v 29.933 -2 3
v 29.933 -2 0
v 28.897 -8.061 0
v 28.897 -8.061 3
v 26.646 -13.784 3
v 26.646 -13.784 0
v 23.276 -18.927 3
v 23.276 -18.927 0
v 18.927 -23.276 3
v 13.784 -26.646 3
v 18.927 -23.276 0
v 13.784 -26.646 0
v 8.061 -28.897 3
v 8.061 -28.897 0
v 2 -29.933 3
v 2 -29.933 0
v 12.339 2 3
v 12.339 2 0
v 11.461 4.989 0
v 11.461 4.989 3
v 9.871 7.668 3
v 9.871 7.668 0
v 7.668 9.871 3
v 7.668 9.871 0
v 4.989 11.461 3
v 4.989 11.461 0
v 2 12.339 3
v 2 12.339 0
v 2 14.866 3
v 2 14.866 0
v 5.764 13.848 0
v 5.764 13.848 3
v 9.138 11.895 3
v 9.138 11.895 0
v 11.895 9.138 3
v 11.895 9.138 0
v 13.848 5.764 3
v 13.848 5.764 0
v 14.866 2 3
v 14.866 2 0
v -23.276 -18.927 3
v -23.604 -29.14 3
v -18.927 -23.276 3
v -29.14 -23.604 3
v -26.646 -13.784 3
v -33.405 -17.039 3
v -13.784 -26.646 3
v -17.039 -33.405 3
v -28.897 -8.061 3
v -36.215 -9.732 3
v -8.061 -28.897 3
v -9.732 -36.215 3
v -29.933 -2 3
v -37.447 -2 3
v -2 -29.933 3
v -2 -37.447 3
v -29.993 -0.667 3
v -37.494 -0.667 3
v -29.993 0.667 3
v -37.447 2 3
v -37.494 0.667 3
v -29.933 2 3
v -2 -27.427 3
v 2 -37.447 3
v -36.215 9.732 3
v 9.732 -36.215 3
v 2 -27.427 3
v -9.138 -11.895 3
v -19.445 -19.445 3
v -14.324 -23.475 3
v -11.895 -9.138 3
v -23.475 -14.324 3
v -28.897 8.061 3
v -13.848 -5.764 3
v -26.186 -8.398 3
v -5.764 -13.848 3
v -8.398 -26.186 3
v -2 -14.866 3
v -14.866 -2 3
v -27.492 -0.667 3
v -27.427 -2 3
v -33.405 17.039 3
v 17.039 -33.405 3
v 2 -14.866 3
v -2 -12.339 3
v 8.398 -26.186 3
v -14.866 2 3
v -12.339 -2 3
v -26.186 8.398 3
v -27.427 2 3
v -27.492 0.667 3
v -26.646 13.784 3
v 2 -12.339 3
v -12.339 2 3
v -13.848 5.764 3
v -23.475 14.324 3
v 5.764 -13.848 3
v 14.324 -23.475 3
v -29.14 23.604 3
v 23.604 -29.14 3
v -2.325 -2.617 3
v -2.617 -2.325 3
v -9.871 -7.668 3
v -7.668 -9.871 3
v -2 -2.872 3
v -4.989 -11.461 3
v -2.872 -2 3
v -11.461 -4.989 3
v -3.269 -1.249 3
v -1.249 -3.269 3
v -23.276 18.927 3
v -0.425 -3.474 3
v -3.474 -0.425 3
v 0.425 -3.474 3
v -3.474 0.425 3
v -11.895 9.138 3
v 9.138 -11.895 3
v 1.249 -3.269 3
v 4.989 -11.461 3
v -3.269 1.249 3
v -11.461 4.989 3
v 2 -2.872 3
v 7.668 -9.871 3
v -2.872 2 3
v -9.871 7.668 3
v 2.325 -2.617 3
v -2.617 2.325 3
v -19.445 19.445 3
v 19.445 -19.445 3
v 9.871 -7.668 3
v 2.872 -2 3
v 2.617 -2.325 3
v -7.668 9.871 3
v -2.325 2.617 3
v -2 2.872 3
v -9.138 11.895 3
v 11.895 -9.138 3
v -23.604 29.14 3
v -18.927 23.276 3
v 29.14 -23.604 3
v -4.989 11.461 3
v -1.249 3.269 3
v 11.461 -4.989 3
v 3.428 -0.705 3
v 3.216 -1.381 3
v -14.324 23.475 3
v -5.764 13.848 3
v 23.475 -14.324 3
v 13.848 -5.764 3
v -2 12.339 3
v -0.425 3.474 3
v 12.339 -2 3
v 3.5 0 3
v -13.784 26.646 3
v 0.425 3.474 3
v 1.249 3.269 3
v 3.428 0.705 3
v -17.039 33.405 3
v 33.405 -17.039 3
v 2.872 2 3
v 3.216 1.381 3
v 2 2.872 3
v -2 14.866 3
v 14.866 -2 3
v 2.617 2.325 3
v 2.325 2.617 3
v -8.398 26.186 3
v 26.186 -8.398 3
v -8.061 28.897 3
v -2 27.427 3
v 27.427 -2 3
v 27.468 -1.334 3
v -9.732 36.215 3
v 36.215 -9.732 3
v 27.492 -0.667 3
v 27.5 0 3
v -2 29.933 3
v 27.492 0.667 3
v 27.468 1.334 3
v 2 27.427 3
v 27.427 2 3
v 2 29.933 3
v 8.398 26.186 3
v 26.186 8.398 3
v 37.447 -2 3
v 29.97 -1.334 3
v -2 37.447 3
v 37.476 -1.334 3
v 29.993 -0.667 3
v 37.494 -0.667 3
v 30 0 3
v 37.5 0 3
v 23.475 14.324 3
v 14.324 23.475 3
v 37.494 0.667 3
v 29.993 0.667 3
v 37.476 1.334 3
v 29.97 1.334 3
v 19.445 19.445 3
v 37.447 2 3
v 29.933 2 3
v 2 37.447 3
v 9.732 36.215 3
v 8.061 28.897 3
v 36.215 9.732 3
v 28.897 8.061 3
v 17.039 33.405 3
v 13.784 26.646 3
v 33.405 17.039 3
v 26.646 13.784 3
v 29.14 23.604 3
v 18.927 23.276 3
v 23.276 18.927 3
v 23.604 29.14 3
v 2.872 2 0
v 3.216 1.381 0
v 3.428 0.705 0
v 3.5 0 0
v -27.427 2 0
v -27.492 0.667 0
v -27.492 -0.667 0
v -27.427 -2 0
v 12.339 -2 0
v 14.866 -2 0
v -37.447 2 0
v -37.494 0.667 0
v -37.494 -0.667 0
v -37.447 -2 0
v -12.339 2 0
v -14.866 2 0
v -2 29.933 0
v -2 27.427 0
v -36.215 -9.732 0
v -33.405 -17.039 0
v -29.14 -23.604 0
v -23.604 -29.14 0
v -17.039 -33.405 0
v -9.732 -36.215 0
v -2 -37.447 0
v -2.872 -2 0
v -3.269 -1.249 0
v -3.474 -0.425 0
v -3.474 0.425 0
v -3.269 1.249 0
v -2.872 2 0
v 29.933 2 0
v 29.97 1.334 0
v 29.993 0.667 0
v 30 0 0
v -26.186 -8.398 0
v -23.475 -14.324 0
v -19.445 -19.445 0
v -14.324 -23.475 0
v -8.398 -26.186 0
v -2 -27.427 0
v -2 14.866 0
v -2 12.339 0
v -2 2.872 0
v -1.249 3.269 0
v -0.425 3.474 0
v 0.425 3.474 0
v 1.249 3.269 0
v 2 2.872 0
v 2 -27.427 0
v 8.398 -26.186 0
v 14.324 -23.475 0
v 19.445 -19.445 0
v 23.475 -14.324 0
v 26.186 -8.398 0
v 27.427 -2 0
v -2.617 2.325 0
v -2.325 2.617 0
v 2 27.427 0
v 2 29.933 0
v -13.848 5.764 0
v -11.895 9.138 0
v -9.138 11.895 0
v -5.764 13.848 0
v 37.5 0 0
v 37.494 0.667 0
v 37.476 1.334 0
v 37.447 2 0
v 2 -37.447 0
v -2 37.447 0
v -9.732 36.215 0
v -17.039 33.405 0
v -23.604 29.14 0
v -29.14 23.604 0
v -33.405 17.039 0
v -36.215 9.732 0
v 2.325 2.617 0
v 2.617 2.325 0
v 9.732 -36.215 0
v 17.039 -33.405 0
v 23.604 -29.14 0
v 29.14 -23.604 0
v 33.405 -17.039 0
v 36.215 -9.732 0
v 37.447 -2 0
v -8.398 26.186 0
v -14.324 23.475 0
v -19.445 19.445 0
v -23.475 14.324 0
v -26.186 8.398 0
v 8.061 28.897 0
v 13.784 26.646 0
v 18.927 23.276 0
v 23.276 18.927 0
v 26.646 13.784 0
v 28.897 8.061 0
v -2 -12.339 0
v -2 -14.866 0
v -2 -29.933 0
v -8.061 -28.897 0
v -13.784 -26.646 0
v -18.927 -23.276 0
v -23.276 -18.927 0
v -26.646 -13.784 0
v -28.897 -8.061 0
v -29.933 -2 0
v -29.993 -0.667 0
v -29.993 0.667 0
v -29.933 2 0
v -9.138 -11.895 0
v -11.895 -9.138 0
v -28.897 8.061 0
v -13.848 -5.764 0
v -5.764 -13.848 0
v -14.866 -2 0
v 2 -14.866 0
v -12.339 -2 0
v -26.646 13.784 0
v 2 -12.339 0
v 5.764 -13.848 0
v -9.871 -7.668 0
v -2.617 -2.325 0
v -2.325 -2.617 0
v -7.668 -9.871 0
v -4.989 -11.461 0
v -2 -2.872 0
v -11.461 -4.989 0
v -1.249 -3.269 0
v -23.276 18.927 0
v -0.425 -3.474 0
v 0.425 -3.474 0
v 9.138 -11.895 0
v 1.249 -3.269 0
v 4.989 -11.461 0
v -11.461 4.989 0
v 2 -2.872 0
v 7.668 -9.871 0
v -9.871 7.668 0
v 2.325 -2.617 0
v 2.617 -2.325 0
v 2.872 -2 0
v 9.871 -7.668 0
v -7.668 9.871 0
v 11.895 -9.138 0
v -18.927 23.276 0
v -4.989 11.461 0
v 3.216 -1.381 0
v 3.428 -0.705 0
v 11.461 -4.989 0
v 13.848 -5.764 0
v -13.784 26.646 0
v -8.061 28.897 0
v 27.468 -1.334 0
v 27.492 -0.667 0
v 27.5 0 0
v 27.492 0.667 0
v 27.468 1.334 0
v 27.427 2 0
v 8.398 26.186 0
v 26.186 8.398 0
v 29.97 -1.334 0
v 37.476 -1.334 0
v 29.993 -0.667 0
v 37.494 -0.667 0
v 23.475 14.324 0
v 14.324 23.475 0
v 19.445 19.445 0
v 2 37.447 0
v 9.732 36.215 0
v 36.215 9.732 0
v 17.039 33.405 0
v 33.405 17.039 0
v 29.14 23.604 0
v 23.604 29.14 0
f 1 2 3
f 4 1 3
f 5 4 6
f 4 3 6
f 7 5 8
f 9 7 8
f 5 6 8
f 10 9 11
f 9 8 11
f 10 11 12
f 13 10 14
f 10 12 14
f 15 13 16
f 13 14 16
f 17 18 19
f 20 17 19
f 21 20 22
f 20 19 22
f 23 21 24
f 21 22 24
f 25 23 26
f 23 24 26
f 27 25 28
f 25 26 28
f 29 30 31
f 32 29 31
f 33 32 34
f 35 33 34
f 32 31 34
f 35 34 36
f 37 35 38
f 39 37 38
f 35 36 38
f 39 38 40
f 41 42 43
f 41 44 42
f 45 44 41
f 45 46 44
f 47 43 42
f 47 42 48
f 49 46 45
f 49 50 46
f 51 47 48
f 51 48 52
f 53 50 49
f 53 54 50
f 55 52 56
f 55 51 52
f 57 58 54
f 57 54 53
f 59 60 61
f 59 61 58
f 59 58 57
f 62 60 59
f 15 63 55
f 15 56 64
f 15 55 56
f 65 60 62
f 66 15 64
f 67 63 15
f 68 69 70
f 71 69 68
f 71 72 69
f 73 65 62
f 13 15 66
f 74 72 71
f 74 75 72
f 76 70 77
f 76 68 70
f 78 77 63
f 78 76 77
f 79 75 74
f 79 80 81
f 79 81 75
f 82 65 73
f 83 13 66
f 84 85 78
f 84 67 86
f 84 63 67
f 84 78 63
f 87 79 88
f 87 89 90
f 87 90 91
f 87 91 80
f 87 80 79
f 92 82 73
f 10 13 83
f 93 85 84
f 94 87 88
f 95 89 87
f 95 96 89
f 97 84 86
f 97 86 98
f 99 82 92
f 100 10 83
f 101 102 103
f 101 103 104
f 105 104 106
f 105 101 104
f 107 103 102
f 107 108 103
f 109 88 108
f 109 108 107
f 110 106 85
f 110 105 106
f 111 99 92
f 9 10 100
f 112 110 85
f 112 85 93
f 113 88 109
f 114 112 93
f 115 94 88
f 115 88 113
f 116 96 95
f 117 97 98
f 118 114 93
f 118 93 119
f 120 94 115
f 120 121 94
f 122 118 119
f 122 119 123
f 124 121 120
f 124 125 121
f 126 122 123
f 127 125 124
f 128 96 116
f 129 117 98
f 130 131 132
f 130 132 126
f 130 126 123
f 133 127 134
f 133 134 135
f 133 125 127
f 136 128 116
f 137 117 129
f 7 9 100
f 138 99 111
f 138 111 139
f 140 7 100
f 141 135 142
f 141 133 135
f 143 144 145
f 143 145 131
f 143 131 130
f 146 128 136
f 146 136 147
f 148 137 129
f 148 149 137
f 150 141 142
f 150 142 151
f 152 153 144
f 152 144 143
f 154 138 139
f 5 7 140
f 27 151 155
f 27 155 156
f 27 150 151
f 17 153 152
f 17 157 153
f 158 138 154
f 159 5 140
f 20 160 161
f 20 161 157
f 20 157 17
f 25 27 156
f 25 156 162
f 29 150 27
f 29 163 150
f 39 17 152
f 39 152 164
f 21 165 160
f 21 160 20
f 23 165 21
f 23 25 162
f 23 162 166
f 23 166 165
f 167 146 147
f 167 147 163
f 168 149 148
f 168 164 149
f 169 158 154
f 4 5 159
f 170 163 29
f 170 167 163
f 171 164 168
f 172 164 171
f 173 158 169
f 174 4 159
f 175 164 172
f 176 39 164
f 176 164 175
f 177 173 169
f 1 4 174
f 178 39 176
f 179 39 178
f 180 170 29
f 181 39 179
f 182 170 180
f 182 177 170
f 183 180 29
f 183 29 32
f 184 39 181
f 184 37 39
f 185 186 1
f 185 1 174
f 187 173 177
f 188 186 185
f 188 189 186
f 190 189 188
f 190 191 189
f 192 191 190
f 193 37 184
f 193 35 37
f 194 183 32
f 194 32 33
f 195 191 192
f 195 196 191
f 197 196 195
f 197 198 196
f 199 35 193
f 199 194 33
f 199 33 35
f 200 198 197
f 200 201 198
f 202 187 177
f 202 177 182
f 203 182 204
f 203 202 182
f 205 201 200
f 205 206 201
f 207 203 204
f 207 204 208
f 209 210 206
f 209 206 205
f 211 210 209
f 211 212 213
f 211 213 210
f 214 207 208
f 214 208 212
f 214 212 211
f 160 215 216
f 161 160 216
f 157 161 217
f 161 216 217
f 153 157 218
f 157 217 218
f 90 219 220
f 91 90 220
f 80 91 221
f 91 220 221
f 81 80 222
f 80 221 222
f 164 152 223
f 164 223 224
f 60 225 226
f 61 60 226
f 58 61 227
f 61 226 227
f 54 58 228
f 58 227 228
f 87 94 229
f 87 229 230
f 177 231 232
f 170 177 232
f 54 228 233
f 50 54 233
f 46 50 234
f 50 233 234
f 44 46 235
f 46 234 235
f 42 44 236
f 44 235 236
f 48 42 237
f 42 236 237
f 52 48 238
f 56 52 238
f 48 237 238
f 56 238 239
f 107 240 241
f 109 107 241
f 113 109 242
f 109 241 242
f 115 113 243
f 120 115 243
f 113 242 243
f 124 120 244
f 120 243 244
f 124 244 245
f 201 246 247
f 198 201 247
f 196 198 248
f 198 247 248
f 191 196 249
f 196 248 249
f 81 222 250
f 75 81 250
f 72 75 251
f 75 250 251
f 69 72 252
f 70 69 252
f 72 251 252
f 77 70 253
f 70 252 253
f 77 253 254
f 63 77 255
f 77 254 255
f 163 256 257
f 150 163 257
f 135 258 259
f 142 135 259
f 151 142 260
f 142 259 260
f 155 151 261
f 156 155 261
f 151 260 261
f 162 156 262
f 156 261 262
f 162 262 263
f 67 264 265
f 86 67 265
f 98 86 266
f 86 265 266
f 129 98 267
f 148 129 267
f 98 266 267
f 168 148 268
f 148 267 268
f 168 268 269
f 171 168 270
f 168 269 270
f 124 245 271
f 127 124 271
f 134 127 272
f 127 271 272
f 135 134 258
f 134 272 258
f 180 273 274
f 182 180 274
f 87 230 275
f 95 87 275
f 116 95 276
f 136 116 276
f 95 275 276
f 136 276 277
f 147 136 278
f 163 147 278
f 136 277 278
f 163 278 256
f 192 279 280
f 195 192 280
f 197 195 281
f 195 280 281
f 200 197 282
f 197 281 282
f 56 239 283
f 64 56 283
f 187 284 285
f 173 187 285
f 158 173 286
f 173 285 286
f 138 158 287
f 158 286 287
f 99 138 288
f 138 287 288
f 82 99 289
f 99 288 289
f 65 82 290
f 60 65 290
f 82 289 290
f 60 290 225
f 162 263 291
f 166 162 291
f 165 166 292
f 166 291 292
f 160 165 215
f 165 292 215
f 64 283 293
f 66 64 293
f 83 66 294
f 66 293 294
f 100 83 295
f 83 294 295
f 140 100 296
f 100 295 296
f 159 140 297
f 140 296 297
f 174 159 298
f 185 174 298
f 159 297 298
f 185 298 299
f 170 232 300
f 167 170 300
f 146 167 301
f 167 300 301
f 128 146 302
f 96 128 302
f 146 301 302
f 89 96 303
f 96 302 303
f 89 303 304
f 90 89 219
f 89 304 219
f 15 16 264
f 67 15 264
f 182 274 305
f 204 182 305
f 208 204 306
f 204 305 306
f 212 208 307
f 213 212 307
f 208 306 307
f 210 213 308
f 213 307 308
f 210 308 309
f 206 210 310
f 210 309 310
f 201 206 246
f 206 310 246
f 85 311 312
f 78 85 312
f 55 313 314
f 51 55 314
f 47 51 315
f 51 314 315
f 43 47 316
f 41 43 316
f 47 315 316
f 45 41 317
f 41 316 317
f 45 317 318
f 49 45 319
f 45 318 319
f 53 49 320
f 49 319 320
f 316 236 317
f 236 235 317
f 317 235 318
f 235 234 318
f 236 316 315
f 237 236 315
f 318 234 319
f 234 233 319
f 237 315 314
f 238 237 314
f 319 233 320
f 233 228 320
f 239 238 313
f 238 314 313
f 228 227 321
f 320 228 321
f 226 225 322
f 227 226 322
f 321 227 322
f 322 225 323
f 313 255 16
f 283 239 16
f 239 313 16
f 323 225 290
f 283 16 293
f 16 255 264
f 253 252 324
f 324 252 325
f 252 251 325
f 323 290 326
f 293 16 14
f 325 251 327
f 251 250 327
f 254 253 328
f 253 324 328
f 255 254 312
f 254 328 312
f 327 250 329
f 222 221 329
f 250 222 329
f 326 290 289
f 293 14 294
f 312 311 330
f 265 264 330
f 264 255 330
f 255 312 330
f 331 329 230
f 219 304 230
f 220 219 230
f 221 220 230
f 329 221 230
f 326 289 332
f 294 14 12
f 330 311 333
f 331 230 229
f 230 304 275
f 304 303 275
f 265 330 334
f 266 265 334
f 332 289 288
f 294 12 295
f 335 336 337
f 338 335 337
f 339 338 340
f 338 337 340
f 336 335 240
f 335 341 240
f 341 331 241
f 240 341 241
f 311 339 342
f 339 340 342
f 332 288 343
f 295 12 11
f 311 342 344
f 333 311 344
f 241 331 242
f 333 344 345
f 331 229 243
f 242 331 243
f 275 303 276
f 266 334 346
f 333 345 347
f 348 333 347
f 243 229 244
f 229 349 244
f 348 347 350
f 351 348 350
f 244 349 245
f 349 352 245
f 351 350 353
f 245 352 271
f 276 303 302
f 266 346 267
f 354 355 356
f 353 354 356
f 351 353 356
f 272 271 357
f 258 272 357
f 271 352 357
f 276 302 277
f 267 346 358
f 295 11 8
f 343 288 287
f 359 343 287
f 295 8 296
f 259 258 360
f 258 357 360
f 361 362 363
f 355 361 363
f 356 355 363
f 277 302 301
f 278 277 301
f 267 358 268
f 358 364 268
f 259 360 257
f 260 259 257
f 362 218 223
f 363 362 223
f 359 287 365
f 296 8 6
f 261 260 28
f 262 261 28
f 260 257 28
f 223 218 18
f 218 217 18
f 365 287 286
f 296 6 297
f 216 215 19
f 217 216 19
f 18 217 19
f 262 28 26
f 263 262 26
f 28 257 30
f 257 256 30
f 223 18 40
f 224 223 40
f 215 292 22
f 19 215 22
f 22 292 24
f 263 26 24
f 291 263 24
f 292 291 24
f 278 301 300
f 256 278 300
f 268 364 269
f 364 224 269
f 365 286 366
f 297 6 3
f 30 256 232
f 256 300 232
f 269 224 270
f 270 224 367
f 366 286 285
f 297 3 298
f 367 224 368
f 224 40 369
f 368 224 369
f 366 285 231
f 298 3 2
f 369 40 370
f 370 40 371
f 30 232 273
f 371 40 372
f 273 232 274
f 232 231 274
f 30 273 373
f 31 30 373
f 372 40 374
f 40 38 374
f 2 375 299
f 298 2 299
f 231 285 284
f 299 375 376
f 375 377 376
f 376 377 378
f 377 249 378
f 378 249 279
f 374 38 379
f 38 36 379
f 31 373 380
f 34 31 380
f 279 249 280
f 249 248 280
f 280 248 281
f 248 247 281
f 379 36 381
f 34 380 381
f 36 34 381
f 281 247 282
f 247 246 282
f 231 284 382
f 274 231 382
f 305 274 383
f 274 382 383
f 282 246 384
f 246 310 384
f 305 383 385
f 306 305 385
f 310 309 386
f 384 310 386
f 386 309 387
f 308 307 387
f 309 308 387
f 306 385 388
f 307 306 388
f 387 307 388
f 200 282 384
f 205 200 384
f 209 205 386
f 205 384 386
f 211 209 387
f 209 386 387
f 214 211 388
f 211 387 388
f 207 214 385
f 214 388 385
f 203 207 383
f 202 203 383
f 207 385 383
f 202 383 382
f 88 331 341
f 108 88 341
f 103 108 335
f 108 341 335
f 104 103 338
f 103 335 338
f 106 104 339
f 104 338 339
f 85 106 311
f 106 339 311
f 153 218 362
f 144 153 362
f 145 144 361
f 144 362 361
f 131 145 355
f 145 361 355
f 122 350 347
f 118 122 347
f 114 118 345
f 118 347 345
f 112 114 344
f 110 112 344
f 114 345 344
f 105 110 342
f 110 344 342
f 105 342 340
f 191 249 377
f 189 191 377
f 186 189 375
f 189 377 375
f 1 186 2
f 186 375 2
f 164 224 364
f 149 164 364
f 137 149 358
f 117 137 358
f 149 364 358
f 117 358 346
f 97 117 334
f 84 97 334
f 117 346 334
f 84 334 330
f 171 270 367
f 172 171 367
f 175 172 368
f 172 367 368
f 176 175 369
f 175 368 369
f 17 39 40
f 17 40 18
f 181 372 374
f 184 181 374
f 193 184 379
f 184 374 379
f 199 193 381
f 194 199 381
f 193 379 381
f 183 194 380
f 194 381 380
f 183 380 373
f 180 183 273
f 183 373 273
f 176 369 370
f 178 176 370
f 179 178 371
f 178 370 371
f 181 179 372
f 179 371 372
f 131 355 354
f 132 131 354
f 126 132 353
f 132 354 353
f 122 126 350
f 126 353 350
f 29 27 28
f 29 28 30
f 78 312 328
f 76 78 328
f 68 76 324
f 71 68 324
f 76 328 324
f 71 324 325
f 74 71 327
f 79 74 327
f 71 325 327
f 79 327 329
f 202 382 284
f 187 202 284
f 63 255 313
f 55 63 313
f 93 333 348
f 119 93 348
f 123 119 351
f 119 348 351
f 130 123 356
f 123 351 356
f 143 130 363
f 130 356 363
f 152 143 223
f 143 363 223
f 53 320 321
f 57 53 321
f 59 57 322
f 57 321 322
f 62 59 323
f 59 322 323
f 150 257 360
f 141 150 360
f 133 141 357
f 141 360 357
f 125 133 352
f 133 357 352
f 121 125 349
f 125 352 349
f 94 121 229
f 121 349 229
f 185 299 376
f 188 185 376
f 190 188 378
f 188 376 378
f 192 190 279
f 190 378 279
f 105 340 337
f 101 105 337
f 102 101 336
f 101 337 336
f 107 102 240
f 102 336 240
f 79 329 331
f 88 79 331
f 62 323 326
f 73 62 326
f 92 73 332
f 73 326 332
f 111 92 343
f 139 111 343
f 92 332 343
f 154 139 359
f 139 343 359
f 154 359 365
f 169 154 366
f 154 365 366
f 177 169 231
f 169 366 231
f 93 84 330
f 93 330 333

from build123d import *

# Parameters (mm, degrees)
F1_DEPTH = 3


with BuildPart() as f1:
    # F0 (on Top) → F1 (new body)
    with BuildSketch(Plane.XY):
        with BuildLine():
            Line((-2, 29.9332590942), (-2, 37.4466286867))
            ThreePointArc((-2, 37.4466286867), (-26.5165042945, 26.5165042945), (-37.4466286867, 2))
            Line((-37.4466286867, 2), (-29.9332590942, 2))
            ThreePointArc((-29.9332590942, 2), (-21.2132034356, 21.2132034356), (-2, 29.9332590942))
        make_face()
        with BuildLine():
            Line((-29.9332590942, -2), (-37.4466286867, -2))
            ThreePointArc((-37.4466286867, -2), (-26.5165042945, -26.5165042945), (-2, -37.4466286867))
            Line((-2, -37.4466286867), (-2, -29.9332590942))
            ThreePointArc((-2, -29.9332590942), (-21.2132034356, -21.2132034356), (-29.9332590942, -2))
        make_face()
        with BuildLine():
            Line((-14.8660687473, -2), (-27.4271763038, -2))
            ThreePointArc((-27.4271763038, -2), (-19.4454364826, -19.4454364826), (-2, -27.4271763038))
            Line((-2, -27.4271763038), (-2, -14.8660687473))
            ThreePointArc((-2, -14.8660687473), (-10.6066017178, -10.6066017178), (-14.8660687473, -2))
        make_face()
        with BuildLine():
            Line((-2, 14.8660687473), (-2, 27.4271763038))
            ThreePointArc((-2, 27.4271763038), (-19.4454364826, 19.4454364826), (-27.4271763038, 2))
            Line((-27.4271763038, 2), (-14.8660687473, 2))
            ThreePointArc((-14.8660687473, 2), (-10.6066017178, 10.6066017178), (-2, 14.8660687473))
        make_face()
        with BuildLine():
            ThreePointArc((27.4271763038, 2), (19.4454364826, 19.4454364826), (2, 27.4271763038))
            Line((2, 27.4271763038), (2, 14.8660687473))
            ThreePointArc((2, 14.8660687473), (10.6066017178, 10.6066017178), (14.8660687473, 2))
            Line((14.8660687473, 2), (27.4271763038, 2))
        make_face()
        with BuildLine():
            ThreePointArc((2, -27.4271763038), (19.4454364826, -19.4454364826), (27.4271763038, -2))
            Line((27.4271763038, -2), (14.8660687473, -2))
            ThreePointArc((14.8660687473, -2), (10.6066017178, -10.6066017178), (2, -14.8660687473))
            Line((2, -14.8660687473), (2, -27.4271763038))
        make_face()
        with BuildLine():
            ThreePointArc((2, -37.4466286867), (26.5165042945, -26.5165042945), (37.4466286867, -2))
            Line((37.4466286867, -2), (29.9332590942, -2))
            ThreePointArc((29.9332590942, -2), (21.2132034356, -21.2132034356), (2, -29.9332590942))
            Line((2, -29.9332590942), (2, -37.4466286867))
        make_face()
        with BuildLine():
            ThreePointArc((37.4466286867, 2), (26.5165042945, 26.5165042945), (2, 37.4466286867))
            Line((2, 37.4466286867), (2, 29.9332590942))
            ThreePointArc((2, 29.9332590942), (21.2132034356, 21.2132034356), (29.9332590942, 2))
            Line((29.9332590942, 2), (37.4466286867, 2))
        make_face()
        with BuildLine():
            Line((2, 14.8660687473), (2, 27.4271763038))
            ThreePointArc((2, 27.4271763038), (0, 27.5), (-2, 27.4271763038))
            Line((-2, 27.4271763038), (-2, 14.8660687473))
            ThreePointArc((-2, 14.8660687473), (0, 15), (2, 14.8660687473))
        make_face()
        with BuildLine():
            Line((2, 27.4271763038), (2, 29.9332590942))
            ThreePointArc((2, 29.9332590942), (0, 30), (-2, 29.9332590942))
            Line((-2, 29.9332590942), (-2, 27.4271763038))
            ThreePointArc((-2, 27.4271763038), (0, 27.5), (2, 27.4271763038))
        make_face()
        with BuildLine():
            Line((2, 29.9332590942), (2, 37.4466286867))
            Line((2, 37.4466286867), (-2, 37.4466286867))
            Line((-2, 37.4466286867), (-2, 29.9332590942))
            ThreePointArc((-2, 29.9332590942), (0, 30), (2, 29.9332590942))
        make_face()
        with BuildLine():
            Line((2, 12.3389626793), (2, 14.8660687473))
            ThreePointArc((2, 14.8660687473), (0, 15), (-2, 14.8660687473))
            Line((-2, 14.8660687473), (-2, 12.3389626793))
            ThreePointArc((-2, 12.3389626793), (0, 12.5), (2, 12.3389626793))
        make_face()
        with BuildLine():
            Line((2, 2.8722813233), (2, 12.3389626793))
            ThreePointArc((2, 12.3389626793), (0, 12.5), (-2, 12.3389626793))
            Line((-2, 12.3389626793), (-2, 2.8722813233))
            ThreePointArc((-2, 2.8722813233), (0, 3.5), (2, 2.8722813233))
        make_face()
        with BuildLine():
            Line((-2.8722813233, 2), (-12.3389626793, 2))
            ThreePointArc((-12.3389626793, 2), (-12.5, 0), (-12.3389626793, -2))
            Line((-12.3389626793, -2), (-2.8722813233, -2))
            ThreePointArc((-2.8722813233, -2), (-3.5, 0), (-2.8722813233, 2))
        make_face()
        with BuildLine():
            Line((-14.8660687473, 2), (-27.4271763038, 2))
            ThreePointArc((-27.4271763038, 2), (-27.5, 0), (-27.4271763038, -2))
            Line((-27.4271763038, -2), (-14.8660687473, -2))
            ThreePointArc((-14.8660687473, -2), (-15, 0), (-14.8660687473, 2))
        make_face()
        with BuildLine():
            Line((-12.3389626793, 2), (-14.8660687473, 2))
            ThreePointArc((-14.8660687473, 2), (-15, 0), (-14.8660687473, -2))
            Line((-14.8660687473, -2), (-12.3389626793, -2))
            ThreePointArc((-12.3389626793, -2), (-12.5, 0), (-12.3389626793, 2))
        make_face()
        with BuildLine():
            Line((-2, 2.8722813233), (-2, 12.3389626793))
            ThreePointArc((-2, 12.3389626793), (-8.8388347648, 8.8388347648), (-12.3389626793, 2))
            Line((-12.3389626793, 2), (-2.8722813233, 2))
            ThreePointArc((-2.8722813233, 2), (-2.4748737342, 2.4748737342), (-2, 2.8722813233))
        make_face()
        with BuildLine():
            Line((-2.8722813233, -2), (-12.3389626793, -2))
            ThreePointArc((-12.3389626793, -2), (-8.8388347648, -8.8388347648), (-2, -12.3389626793))
            Line((-2, -12.3389626793), (-2, -2.8722813233))
            ThreePointArc((-2, -2.8722813233), (-2.4748737342, -2.4748737342), (-2.8722813233, -2))
        make_face()
        with BuildLine():
            ThreePointArc((12.3389626793, 2), (8.8388347648, 8.8388347648), (2, 12.3389626793))
            Line((2, 12.3389626793), (2, 2.8722813233))
            ThreePointArc((2, 2.8722813233), (2.4748737342, 2.4748737342), (2.8722813233, 2))
            Line((2.8722813233, 2), (12.3389626793, 2))
        make_face()
        with BuildLine():
            ThreePointArc((2, -12.3389626793), (8.8388347648, -8.8388347648), (12.3389626793, -2))
            Line((12.3389626793, -2), (2.8722813233, -2))
            ThreePointArc((2.8722813233, -2), (2.4748737342, -2.4748737342), (2, -2.8722813233))
            Line((2, -2.8722813233), (2, -12.3389626793))
        make_face()
        with BuildLine():
            Line((-2, -2.8722813233), (-2, -12.3389626793))
            ThreePointArc((-2, -12.3389626793), (0, -12.5), (2, -12.3389626793))
            Line((2, -12.3389626793), (2, -2.8722813233))
            ThreePointArc((2, -2.8722813233), (0, -3.5), (-2, -2.8722813233))
        make_face()
        with BuildLine():
            Line((-2, -12.3389626793), (-2, -14.8660687473))
            ThreePointArc((-2, -14.8660687473), (0, -15), (2, -14.8660687473))
            Line((2, -14.8660687473), (2, -12.3389626793))
            ThreePointArc((2, -12.3389626793), (0, -12.5), (-2, -12.3389626793))
        make_face()
        with BuildLine():
            Line((-2, -14.8660687473), (-2, -27.4271763038))
            ThreePointArc((-2, -27.4271763038), (0, -27.5), (2, -27.4271763038))
            Line((2, -27.4271763038), (2, -14.8660687473))
            ThreePointArc((2, -14.8660687473), (0, -15), (-2, -14.8660687473))
        make_face()
        with BuildLine():
            Line((-2, -29.9332590942), (-2, -37.4466286867))
            Line((-2, -37.4466286867), (2, -37.4466286867))
            Line((2, -37.4466286867), (2, -29.9332590942))
            ThreePointArc((2, -29.9332590942), (0, -30), (-2, -29.9332590942))
        make_face()
        with BuildLine():
            Line((-2, -27.4271763038), (-2, -29.9332590942))
            ThreePointArc((-2, -29.9332590942), (0, -30), (2, -29.9332590942))
            Line((2, -29.9332590942), (2, -27.4271763038))
            ThreePointArc((2, -27.4271763038), (0, -27.5), (-2, -27.4271763038))
        make_face()
        with BuildLine():
            ThreePointArc((15, 0), (14.9664797332, 1.0022396895), (14.8660687473, 2))
            Line((14.8660687473, 2), (12.3389626793, 2))
            ThreePointArc((12.3389626793, 2), (12.4596756276, 1.0032363902), (12.5, 0))
            ThreePointArc((12.5, 0), (12.4596756276, -1.0032363902), (12.3389626793, -2))
            Line((12.3389626793, -2), (14.8660687473, -2))
            ThreePointArc((14.8660687473, -2), (14.9664797332, -1.0022396895), (15, 0))
        make_face()
        with BuildLine():
            ThreePointArc((12.5, 0), (12.4596756276, 1.0032363902), (12.3389626793, 2))
            Line((12.3389626793, 2), (2.8722813233, 2))
            ThreePointArc((2.8722813233, 2), (3.3393850206, 1.0480971731), (3.5, 0))
            ThreePointArc((3.5, 0), (3.3393850206, -1.0480971731), (2.8722813233, -2))
            Line((2.8722813233, -2), (12.3389626793, -2))
            ThreePointArc((12.3389626793, -2), (12.4596756276, -1.0032363902), (12.5, 0))
        make_face()
        with BuildLine():
            ThreePointArc((27.5, 0), (27.4817880455, 1.0006626918), (27.4271763038, 2))
            Line((27.4271763038, 2), (14.8660687473, 2))
            ThreePointArc((14.8660687473, 2), (14.9664797332, 1.0022396895), (15, 0))
            ThreePointArc((15, 0), (14.9664797332, -1.0022396895), (14.8660687473, -2))
            Line((14.8660687473, -2), (27.4271763038, -2))
            ThreePointArc((27.4271763038, -2), (27.4817880455, -1.0006626918), (27.5, 0))
        make_face()
        with BuildLine():
            ThreePointArc((37.5, 0), (37.4866547971, 1.0003559988), (37.4466286867, 2))
            Line((37.4466286867, 2), (29.9332590942, 2))
            ThreePointArc((29.9332590942, 2), (29.983310131, 1.0005566386), (30, 0))
            ThreePointArc((30, 0), (29.983310131, -1.0005566386), (29.9332590942, -2))
            Line((29.9332590942, -2), (37.4466286867, -2))
            ThreePointArc((37.4466286867, -2), (37.4866547971, -1.0003559988), (37.5, 0))
        make_face()
        with BuildLine():
            Line((-29.9332590942, 2), (-37.4466286867, 2))
            ThreePointArc((-37.4466286867, 2), (-37.5, 0), (-37.4466286867, -2))
            Line((-37.4466286867, -2), (-29.9332590942, -2))
            ThreePointArc((-29.9332590942, -2), (-30, 0), (-29.9332590942, 2))
        make_face()
    extrude(amount=F1_DEPTH)


solid = f1.part
